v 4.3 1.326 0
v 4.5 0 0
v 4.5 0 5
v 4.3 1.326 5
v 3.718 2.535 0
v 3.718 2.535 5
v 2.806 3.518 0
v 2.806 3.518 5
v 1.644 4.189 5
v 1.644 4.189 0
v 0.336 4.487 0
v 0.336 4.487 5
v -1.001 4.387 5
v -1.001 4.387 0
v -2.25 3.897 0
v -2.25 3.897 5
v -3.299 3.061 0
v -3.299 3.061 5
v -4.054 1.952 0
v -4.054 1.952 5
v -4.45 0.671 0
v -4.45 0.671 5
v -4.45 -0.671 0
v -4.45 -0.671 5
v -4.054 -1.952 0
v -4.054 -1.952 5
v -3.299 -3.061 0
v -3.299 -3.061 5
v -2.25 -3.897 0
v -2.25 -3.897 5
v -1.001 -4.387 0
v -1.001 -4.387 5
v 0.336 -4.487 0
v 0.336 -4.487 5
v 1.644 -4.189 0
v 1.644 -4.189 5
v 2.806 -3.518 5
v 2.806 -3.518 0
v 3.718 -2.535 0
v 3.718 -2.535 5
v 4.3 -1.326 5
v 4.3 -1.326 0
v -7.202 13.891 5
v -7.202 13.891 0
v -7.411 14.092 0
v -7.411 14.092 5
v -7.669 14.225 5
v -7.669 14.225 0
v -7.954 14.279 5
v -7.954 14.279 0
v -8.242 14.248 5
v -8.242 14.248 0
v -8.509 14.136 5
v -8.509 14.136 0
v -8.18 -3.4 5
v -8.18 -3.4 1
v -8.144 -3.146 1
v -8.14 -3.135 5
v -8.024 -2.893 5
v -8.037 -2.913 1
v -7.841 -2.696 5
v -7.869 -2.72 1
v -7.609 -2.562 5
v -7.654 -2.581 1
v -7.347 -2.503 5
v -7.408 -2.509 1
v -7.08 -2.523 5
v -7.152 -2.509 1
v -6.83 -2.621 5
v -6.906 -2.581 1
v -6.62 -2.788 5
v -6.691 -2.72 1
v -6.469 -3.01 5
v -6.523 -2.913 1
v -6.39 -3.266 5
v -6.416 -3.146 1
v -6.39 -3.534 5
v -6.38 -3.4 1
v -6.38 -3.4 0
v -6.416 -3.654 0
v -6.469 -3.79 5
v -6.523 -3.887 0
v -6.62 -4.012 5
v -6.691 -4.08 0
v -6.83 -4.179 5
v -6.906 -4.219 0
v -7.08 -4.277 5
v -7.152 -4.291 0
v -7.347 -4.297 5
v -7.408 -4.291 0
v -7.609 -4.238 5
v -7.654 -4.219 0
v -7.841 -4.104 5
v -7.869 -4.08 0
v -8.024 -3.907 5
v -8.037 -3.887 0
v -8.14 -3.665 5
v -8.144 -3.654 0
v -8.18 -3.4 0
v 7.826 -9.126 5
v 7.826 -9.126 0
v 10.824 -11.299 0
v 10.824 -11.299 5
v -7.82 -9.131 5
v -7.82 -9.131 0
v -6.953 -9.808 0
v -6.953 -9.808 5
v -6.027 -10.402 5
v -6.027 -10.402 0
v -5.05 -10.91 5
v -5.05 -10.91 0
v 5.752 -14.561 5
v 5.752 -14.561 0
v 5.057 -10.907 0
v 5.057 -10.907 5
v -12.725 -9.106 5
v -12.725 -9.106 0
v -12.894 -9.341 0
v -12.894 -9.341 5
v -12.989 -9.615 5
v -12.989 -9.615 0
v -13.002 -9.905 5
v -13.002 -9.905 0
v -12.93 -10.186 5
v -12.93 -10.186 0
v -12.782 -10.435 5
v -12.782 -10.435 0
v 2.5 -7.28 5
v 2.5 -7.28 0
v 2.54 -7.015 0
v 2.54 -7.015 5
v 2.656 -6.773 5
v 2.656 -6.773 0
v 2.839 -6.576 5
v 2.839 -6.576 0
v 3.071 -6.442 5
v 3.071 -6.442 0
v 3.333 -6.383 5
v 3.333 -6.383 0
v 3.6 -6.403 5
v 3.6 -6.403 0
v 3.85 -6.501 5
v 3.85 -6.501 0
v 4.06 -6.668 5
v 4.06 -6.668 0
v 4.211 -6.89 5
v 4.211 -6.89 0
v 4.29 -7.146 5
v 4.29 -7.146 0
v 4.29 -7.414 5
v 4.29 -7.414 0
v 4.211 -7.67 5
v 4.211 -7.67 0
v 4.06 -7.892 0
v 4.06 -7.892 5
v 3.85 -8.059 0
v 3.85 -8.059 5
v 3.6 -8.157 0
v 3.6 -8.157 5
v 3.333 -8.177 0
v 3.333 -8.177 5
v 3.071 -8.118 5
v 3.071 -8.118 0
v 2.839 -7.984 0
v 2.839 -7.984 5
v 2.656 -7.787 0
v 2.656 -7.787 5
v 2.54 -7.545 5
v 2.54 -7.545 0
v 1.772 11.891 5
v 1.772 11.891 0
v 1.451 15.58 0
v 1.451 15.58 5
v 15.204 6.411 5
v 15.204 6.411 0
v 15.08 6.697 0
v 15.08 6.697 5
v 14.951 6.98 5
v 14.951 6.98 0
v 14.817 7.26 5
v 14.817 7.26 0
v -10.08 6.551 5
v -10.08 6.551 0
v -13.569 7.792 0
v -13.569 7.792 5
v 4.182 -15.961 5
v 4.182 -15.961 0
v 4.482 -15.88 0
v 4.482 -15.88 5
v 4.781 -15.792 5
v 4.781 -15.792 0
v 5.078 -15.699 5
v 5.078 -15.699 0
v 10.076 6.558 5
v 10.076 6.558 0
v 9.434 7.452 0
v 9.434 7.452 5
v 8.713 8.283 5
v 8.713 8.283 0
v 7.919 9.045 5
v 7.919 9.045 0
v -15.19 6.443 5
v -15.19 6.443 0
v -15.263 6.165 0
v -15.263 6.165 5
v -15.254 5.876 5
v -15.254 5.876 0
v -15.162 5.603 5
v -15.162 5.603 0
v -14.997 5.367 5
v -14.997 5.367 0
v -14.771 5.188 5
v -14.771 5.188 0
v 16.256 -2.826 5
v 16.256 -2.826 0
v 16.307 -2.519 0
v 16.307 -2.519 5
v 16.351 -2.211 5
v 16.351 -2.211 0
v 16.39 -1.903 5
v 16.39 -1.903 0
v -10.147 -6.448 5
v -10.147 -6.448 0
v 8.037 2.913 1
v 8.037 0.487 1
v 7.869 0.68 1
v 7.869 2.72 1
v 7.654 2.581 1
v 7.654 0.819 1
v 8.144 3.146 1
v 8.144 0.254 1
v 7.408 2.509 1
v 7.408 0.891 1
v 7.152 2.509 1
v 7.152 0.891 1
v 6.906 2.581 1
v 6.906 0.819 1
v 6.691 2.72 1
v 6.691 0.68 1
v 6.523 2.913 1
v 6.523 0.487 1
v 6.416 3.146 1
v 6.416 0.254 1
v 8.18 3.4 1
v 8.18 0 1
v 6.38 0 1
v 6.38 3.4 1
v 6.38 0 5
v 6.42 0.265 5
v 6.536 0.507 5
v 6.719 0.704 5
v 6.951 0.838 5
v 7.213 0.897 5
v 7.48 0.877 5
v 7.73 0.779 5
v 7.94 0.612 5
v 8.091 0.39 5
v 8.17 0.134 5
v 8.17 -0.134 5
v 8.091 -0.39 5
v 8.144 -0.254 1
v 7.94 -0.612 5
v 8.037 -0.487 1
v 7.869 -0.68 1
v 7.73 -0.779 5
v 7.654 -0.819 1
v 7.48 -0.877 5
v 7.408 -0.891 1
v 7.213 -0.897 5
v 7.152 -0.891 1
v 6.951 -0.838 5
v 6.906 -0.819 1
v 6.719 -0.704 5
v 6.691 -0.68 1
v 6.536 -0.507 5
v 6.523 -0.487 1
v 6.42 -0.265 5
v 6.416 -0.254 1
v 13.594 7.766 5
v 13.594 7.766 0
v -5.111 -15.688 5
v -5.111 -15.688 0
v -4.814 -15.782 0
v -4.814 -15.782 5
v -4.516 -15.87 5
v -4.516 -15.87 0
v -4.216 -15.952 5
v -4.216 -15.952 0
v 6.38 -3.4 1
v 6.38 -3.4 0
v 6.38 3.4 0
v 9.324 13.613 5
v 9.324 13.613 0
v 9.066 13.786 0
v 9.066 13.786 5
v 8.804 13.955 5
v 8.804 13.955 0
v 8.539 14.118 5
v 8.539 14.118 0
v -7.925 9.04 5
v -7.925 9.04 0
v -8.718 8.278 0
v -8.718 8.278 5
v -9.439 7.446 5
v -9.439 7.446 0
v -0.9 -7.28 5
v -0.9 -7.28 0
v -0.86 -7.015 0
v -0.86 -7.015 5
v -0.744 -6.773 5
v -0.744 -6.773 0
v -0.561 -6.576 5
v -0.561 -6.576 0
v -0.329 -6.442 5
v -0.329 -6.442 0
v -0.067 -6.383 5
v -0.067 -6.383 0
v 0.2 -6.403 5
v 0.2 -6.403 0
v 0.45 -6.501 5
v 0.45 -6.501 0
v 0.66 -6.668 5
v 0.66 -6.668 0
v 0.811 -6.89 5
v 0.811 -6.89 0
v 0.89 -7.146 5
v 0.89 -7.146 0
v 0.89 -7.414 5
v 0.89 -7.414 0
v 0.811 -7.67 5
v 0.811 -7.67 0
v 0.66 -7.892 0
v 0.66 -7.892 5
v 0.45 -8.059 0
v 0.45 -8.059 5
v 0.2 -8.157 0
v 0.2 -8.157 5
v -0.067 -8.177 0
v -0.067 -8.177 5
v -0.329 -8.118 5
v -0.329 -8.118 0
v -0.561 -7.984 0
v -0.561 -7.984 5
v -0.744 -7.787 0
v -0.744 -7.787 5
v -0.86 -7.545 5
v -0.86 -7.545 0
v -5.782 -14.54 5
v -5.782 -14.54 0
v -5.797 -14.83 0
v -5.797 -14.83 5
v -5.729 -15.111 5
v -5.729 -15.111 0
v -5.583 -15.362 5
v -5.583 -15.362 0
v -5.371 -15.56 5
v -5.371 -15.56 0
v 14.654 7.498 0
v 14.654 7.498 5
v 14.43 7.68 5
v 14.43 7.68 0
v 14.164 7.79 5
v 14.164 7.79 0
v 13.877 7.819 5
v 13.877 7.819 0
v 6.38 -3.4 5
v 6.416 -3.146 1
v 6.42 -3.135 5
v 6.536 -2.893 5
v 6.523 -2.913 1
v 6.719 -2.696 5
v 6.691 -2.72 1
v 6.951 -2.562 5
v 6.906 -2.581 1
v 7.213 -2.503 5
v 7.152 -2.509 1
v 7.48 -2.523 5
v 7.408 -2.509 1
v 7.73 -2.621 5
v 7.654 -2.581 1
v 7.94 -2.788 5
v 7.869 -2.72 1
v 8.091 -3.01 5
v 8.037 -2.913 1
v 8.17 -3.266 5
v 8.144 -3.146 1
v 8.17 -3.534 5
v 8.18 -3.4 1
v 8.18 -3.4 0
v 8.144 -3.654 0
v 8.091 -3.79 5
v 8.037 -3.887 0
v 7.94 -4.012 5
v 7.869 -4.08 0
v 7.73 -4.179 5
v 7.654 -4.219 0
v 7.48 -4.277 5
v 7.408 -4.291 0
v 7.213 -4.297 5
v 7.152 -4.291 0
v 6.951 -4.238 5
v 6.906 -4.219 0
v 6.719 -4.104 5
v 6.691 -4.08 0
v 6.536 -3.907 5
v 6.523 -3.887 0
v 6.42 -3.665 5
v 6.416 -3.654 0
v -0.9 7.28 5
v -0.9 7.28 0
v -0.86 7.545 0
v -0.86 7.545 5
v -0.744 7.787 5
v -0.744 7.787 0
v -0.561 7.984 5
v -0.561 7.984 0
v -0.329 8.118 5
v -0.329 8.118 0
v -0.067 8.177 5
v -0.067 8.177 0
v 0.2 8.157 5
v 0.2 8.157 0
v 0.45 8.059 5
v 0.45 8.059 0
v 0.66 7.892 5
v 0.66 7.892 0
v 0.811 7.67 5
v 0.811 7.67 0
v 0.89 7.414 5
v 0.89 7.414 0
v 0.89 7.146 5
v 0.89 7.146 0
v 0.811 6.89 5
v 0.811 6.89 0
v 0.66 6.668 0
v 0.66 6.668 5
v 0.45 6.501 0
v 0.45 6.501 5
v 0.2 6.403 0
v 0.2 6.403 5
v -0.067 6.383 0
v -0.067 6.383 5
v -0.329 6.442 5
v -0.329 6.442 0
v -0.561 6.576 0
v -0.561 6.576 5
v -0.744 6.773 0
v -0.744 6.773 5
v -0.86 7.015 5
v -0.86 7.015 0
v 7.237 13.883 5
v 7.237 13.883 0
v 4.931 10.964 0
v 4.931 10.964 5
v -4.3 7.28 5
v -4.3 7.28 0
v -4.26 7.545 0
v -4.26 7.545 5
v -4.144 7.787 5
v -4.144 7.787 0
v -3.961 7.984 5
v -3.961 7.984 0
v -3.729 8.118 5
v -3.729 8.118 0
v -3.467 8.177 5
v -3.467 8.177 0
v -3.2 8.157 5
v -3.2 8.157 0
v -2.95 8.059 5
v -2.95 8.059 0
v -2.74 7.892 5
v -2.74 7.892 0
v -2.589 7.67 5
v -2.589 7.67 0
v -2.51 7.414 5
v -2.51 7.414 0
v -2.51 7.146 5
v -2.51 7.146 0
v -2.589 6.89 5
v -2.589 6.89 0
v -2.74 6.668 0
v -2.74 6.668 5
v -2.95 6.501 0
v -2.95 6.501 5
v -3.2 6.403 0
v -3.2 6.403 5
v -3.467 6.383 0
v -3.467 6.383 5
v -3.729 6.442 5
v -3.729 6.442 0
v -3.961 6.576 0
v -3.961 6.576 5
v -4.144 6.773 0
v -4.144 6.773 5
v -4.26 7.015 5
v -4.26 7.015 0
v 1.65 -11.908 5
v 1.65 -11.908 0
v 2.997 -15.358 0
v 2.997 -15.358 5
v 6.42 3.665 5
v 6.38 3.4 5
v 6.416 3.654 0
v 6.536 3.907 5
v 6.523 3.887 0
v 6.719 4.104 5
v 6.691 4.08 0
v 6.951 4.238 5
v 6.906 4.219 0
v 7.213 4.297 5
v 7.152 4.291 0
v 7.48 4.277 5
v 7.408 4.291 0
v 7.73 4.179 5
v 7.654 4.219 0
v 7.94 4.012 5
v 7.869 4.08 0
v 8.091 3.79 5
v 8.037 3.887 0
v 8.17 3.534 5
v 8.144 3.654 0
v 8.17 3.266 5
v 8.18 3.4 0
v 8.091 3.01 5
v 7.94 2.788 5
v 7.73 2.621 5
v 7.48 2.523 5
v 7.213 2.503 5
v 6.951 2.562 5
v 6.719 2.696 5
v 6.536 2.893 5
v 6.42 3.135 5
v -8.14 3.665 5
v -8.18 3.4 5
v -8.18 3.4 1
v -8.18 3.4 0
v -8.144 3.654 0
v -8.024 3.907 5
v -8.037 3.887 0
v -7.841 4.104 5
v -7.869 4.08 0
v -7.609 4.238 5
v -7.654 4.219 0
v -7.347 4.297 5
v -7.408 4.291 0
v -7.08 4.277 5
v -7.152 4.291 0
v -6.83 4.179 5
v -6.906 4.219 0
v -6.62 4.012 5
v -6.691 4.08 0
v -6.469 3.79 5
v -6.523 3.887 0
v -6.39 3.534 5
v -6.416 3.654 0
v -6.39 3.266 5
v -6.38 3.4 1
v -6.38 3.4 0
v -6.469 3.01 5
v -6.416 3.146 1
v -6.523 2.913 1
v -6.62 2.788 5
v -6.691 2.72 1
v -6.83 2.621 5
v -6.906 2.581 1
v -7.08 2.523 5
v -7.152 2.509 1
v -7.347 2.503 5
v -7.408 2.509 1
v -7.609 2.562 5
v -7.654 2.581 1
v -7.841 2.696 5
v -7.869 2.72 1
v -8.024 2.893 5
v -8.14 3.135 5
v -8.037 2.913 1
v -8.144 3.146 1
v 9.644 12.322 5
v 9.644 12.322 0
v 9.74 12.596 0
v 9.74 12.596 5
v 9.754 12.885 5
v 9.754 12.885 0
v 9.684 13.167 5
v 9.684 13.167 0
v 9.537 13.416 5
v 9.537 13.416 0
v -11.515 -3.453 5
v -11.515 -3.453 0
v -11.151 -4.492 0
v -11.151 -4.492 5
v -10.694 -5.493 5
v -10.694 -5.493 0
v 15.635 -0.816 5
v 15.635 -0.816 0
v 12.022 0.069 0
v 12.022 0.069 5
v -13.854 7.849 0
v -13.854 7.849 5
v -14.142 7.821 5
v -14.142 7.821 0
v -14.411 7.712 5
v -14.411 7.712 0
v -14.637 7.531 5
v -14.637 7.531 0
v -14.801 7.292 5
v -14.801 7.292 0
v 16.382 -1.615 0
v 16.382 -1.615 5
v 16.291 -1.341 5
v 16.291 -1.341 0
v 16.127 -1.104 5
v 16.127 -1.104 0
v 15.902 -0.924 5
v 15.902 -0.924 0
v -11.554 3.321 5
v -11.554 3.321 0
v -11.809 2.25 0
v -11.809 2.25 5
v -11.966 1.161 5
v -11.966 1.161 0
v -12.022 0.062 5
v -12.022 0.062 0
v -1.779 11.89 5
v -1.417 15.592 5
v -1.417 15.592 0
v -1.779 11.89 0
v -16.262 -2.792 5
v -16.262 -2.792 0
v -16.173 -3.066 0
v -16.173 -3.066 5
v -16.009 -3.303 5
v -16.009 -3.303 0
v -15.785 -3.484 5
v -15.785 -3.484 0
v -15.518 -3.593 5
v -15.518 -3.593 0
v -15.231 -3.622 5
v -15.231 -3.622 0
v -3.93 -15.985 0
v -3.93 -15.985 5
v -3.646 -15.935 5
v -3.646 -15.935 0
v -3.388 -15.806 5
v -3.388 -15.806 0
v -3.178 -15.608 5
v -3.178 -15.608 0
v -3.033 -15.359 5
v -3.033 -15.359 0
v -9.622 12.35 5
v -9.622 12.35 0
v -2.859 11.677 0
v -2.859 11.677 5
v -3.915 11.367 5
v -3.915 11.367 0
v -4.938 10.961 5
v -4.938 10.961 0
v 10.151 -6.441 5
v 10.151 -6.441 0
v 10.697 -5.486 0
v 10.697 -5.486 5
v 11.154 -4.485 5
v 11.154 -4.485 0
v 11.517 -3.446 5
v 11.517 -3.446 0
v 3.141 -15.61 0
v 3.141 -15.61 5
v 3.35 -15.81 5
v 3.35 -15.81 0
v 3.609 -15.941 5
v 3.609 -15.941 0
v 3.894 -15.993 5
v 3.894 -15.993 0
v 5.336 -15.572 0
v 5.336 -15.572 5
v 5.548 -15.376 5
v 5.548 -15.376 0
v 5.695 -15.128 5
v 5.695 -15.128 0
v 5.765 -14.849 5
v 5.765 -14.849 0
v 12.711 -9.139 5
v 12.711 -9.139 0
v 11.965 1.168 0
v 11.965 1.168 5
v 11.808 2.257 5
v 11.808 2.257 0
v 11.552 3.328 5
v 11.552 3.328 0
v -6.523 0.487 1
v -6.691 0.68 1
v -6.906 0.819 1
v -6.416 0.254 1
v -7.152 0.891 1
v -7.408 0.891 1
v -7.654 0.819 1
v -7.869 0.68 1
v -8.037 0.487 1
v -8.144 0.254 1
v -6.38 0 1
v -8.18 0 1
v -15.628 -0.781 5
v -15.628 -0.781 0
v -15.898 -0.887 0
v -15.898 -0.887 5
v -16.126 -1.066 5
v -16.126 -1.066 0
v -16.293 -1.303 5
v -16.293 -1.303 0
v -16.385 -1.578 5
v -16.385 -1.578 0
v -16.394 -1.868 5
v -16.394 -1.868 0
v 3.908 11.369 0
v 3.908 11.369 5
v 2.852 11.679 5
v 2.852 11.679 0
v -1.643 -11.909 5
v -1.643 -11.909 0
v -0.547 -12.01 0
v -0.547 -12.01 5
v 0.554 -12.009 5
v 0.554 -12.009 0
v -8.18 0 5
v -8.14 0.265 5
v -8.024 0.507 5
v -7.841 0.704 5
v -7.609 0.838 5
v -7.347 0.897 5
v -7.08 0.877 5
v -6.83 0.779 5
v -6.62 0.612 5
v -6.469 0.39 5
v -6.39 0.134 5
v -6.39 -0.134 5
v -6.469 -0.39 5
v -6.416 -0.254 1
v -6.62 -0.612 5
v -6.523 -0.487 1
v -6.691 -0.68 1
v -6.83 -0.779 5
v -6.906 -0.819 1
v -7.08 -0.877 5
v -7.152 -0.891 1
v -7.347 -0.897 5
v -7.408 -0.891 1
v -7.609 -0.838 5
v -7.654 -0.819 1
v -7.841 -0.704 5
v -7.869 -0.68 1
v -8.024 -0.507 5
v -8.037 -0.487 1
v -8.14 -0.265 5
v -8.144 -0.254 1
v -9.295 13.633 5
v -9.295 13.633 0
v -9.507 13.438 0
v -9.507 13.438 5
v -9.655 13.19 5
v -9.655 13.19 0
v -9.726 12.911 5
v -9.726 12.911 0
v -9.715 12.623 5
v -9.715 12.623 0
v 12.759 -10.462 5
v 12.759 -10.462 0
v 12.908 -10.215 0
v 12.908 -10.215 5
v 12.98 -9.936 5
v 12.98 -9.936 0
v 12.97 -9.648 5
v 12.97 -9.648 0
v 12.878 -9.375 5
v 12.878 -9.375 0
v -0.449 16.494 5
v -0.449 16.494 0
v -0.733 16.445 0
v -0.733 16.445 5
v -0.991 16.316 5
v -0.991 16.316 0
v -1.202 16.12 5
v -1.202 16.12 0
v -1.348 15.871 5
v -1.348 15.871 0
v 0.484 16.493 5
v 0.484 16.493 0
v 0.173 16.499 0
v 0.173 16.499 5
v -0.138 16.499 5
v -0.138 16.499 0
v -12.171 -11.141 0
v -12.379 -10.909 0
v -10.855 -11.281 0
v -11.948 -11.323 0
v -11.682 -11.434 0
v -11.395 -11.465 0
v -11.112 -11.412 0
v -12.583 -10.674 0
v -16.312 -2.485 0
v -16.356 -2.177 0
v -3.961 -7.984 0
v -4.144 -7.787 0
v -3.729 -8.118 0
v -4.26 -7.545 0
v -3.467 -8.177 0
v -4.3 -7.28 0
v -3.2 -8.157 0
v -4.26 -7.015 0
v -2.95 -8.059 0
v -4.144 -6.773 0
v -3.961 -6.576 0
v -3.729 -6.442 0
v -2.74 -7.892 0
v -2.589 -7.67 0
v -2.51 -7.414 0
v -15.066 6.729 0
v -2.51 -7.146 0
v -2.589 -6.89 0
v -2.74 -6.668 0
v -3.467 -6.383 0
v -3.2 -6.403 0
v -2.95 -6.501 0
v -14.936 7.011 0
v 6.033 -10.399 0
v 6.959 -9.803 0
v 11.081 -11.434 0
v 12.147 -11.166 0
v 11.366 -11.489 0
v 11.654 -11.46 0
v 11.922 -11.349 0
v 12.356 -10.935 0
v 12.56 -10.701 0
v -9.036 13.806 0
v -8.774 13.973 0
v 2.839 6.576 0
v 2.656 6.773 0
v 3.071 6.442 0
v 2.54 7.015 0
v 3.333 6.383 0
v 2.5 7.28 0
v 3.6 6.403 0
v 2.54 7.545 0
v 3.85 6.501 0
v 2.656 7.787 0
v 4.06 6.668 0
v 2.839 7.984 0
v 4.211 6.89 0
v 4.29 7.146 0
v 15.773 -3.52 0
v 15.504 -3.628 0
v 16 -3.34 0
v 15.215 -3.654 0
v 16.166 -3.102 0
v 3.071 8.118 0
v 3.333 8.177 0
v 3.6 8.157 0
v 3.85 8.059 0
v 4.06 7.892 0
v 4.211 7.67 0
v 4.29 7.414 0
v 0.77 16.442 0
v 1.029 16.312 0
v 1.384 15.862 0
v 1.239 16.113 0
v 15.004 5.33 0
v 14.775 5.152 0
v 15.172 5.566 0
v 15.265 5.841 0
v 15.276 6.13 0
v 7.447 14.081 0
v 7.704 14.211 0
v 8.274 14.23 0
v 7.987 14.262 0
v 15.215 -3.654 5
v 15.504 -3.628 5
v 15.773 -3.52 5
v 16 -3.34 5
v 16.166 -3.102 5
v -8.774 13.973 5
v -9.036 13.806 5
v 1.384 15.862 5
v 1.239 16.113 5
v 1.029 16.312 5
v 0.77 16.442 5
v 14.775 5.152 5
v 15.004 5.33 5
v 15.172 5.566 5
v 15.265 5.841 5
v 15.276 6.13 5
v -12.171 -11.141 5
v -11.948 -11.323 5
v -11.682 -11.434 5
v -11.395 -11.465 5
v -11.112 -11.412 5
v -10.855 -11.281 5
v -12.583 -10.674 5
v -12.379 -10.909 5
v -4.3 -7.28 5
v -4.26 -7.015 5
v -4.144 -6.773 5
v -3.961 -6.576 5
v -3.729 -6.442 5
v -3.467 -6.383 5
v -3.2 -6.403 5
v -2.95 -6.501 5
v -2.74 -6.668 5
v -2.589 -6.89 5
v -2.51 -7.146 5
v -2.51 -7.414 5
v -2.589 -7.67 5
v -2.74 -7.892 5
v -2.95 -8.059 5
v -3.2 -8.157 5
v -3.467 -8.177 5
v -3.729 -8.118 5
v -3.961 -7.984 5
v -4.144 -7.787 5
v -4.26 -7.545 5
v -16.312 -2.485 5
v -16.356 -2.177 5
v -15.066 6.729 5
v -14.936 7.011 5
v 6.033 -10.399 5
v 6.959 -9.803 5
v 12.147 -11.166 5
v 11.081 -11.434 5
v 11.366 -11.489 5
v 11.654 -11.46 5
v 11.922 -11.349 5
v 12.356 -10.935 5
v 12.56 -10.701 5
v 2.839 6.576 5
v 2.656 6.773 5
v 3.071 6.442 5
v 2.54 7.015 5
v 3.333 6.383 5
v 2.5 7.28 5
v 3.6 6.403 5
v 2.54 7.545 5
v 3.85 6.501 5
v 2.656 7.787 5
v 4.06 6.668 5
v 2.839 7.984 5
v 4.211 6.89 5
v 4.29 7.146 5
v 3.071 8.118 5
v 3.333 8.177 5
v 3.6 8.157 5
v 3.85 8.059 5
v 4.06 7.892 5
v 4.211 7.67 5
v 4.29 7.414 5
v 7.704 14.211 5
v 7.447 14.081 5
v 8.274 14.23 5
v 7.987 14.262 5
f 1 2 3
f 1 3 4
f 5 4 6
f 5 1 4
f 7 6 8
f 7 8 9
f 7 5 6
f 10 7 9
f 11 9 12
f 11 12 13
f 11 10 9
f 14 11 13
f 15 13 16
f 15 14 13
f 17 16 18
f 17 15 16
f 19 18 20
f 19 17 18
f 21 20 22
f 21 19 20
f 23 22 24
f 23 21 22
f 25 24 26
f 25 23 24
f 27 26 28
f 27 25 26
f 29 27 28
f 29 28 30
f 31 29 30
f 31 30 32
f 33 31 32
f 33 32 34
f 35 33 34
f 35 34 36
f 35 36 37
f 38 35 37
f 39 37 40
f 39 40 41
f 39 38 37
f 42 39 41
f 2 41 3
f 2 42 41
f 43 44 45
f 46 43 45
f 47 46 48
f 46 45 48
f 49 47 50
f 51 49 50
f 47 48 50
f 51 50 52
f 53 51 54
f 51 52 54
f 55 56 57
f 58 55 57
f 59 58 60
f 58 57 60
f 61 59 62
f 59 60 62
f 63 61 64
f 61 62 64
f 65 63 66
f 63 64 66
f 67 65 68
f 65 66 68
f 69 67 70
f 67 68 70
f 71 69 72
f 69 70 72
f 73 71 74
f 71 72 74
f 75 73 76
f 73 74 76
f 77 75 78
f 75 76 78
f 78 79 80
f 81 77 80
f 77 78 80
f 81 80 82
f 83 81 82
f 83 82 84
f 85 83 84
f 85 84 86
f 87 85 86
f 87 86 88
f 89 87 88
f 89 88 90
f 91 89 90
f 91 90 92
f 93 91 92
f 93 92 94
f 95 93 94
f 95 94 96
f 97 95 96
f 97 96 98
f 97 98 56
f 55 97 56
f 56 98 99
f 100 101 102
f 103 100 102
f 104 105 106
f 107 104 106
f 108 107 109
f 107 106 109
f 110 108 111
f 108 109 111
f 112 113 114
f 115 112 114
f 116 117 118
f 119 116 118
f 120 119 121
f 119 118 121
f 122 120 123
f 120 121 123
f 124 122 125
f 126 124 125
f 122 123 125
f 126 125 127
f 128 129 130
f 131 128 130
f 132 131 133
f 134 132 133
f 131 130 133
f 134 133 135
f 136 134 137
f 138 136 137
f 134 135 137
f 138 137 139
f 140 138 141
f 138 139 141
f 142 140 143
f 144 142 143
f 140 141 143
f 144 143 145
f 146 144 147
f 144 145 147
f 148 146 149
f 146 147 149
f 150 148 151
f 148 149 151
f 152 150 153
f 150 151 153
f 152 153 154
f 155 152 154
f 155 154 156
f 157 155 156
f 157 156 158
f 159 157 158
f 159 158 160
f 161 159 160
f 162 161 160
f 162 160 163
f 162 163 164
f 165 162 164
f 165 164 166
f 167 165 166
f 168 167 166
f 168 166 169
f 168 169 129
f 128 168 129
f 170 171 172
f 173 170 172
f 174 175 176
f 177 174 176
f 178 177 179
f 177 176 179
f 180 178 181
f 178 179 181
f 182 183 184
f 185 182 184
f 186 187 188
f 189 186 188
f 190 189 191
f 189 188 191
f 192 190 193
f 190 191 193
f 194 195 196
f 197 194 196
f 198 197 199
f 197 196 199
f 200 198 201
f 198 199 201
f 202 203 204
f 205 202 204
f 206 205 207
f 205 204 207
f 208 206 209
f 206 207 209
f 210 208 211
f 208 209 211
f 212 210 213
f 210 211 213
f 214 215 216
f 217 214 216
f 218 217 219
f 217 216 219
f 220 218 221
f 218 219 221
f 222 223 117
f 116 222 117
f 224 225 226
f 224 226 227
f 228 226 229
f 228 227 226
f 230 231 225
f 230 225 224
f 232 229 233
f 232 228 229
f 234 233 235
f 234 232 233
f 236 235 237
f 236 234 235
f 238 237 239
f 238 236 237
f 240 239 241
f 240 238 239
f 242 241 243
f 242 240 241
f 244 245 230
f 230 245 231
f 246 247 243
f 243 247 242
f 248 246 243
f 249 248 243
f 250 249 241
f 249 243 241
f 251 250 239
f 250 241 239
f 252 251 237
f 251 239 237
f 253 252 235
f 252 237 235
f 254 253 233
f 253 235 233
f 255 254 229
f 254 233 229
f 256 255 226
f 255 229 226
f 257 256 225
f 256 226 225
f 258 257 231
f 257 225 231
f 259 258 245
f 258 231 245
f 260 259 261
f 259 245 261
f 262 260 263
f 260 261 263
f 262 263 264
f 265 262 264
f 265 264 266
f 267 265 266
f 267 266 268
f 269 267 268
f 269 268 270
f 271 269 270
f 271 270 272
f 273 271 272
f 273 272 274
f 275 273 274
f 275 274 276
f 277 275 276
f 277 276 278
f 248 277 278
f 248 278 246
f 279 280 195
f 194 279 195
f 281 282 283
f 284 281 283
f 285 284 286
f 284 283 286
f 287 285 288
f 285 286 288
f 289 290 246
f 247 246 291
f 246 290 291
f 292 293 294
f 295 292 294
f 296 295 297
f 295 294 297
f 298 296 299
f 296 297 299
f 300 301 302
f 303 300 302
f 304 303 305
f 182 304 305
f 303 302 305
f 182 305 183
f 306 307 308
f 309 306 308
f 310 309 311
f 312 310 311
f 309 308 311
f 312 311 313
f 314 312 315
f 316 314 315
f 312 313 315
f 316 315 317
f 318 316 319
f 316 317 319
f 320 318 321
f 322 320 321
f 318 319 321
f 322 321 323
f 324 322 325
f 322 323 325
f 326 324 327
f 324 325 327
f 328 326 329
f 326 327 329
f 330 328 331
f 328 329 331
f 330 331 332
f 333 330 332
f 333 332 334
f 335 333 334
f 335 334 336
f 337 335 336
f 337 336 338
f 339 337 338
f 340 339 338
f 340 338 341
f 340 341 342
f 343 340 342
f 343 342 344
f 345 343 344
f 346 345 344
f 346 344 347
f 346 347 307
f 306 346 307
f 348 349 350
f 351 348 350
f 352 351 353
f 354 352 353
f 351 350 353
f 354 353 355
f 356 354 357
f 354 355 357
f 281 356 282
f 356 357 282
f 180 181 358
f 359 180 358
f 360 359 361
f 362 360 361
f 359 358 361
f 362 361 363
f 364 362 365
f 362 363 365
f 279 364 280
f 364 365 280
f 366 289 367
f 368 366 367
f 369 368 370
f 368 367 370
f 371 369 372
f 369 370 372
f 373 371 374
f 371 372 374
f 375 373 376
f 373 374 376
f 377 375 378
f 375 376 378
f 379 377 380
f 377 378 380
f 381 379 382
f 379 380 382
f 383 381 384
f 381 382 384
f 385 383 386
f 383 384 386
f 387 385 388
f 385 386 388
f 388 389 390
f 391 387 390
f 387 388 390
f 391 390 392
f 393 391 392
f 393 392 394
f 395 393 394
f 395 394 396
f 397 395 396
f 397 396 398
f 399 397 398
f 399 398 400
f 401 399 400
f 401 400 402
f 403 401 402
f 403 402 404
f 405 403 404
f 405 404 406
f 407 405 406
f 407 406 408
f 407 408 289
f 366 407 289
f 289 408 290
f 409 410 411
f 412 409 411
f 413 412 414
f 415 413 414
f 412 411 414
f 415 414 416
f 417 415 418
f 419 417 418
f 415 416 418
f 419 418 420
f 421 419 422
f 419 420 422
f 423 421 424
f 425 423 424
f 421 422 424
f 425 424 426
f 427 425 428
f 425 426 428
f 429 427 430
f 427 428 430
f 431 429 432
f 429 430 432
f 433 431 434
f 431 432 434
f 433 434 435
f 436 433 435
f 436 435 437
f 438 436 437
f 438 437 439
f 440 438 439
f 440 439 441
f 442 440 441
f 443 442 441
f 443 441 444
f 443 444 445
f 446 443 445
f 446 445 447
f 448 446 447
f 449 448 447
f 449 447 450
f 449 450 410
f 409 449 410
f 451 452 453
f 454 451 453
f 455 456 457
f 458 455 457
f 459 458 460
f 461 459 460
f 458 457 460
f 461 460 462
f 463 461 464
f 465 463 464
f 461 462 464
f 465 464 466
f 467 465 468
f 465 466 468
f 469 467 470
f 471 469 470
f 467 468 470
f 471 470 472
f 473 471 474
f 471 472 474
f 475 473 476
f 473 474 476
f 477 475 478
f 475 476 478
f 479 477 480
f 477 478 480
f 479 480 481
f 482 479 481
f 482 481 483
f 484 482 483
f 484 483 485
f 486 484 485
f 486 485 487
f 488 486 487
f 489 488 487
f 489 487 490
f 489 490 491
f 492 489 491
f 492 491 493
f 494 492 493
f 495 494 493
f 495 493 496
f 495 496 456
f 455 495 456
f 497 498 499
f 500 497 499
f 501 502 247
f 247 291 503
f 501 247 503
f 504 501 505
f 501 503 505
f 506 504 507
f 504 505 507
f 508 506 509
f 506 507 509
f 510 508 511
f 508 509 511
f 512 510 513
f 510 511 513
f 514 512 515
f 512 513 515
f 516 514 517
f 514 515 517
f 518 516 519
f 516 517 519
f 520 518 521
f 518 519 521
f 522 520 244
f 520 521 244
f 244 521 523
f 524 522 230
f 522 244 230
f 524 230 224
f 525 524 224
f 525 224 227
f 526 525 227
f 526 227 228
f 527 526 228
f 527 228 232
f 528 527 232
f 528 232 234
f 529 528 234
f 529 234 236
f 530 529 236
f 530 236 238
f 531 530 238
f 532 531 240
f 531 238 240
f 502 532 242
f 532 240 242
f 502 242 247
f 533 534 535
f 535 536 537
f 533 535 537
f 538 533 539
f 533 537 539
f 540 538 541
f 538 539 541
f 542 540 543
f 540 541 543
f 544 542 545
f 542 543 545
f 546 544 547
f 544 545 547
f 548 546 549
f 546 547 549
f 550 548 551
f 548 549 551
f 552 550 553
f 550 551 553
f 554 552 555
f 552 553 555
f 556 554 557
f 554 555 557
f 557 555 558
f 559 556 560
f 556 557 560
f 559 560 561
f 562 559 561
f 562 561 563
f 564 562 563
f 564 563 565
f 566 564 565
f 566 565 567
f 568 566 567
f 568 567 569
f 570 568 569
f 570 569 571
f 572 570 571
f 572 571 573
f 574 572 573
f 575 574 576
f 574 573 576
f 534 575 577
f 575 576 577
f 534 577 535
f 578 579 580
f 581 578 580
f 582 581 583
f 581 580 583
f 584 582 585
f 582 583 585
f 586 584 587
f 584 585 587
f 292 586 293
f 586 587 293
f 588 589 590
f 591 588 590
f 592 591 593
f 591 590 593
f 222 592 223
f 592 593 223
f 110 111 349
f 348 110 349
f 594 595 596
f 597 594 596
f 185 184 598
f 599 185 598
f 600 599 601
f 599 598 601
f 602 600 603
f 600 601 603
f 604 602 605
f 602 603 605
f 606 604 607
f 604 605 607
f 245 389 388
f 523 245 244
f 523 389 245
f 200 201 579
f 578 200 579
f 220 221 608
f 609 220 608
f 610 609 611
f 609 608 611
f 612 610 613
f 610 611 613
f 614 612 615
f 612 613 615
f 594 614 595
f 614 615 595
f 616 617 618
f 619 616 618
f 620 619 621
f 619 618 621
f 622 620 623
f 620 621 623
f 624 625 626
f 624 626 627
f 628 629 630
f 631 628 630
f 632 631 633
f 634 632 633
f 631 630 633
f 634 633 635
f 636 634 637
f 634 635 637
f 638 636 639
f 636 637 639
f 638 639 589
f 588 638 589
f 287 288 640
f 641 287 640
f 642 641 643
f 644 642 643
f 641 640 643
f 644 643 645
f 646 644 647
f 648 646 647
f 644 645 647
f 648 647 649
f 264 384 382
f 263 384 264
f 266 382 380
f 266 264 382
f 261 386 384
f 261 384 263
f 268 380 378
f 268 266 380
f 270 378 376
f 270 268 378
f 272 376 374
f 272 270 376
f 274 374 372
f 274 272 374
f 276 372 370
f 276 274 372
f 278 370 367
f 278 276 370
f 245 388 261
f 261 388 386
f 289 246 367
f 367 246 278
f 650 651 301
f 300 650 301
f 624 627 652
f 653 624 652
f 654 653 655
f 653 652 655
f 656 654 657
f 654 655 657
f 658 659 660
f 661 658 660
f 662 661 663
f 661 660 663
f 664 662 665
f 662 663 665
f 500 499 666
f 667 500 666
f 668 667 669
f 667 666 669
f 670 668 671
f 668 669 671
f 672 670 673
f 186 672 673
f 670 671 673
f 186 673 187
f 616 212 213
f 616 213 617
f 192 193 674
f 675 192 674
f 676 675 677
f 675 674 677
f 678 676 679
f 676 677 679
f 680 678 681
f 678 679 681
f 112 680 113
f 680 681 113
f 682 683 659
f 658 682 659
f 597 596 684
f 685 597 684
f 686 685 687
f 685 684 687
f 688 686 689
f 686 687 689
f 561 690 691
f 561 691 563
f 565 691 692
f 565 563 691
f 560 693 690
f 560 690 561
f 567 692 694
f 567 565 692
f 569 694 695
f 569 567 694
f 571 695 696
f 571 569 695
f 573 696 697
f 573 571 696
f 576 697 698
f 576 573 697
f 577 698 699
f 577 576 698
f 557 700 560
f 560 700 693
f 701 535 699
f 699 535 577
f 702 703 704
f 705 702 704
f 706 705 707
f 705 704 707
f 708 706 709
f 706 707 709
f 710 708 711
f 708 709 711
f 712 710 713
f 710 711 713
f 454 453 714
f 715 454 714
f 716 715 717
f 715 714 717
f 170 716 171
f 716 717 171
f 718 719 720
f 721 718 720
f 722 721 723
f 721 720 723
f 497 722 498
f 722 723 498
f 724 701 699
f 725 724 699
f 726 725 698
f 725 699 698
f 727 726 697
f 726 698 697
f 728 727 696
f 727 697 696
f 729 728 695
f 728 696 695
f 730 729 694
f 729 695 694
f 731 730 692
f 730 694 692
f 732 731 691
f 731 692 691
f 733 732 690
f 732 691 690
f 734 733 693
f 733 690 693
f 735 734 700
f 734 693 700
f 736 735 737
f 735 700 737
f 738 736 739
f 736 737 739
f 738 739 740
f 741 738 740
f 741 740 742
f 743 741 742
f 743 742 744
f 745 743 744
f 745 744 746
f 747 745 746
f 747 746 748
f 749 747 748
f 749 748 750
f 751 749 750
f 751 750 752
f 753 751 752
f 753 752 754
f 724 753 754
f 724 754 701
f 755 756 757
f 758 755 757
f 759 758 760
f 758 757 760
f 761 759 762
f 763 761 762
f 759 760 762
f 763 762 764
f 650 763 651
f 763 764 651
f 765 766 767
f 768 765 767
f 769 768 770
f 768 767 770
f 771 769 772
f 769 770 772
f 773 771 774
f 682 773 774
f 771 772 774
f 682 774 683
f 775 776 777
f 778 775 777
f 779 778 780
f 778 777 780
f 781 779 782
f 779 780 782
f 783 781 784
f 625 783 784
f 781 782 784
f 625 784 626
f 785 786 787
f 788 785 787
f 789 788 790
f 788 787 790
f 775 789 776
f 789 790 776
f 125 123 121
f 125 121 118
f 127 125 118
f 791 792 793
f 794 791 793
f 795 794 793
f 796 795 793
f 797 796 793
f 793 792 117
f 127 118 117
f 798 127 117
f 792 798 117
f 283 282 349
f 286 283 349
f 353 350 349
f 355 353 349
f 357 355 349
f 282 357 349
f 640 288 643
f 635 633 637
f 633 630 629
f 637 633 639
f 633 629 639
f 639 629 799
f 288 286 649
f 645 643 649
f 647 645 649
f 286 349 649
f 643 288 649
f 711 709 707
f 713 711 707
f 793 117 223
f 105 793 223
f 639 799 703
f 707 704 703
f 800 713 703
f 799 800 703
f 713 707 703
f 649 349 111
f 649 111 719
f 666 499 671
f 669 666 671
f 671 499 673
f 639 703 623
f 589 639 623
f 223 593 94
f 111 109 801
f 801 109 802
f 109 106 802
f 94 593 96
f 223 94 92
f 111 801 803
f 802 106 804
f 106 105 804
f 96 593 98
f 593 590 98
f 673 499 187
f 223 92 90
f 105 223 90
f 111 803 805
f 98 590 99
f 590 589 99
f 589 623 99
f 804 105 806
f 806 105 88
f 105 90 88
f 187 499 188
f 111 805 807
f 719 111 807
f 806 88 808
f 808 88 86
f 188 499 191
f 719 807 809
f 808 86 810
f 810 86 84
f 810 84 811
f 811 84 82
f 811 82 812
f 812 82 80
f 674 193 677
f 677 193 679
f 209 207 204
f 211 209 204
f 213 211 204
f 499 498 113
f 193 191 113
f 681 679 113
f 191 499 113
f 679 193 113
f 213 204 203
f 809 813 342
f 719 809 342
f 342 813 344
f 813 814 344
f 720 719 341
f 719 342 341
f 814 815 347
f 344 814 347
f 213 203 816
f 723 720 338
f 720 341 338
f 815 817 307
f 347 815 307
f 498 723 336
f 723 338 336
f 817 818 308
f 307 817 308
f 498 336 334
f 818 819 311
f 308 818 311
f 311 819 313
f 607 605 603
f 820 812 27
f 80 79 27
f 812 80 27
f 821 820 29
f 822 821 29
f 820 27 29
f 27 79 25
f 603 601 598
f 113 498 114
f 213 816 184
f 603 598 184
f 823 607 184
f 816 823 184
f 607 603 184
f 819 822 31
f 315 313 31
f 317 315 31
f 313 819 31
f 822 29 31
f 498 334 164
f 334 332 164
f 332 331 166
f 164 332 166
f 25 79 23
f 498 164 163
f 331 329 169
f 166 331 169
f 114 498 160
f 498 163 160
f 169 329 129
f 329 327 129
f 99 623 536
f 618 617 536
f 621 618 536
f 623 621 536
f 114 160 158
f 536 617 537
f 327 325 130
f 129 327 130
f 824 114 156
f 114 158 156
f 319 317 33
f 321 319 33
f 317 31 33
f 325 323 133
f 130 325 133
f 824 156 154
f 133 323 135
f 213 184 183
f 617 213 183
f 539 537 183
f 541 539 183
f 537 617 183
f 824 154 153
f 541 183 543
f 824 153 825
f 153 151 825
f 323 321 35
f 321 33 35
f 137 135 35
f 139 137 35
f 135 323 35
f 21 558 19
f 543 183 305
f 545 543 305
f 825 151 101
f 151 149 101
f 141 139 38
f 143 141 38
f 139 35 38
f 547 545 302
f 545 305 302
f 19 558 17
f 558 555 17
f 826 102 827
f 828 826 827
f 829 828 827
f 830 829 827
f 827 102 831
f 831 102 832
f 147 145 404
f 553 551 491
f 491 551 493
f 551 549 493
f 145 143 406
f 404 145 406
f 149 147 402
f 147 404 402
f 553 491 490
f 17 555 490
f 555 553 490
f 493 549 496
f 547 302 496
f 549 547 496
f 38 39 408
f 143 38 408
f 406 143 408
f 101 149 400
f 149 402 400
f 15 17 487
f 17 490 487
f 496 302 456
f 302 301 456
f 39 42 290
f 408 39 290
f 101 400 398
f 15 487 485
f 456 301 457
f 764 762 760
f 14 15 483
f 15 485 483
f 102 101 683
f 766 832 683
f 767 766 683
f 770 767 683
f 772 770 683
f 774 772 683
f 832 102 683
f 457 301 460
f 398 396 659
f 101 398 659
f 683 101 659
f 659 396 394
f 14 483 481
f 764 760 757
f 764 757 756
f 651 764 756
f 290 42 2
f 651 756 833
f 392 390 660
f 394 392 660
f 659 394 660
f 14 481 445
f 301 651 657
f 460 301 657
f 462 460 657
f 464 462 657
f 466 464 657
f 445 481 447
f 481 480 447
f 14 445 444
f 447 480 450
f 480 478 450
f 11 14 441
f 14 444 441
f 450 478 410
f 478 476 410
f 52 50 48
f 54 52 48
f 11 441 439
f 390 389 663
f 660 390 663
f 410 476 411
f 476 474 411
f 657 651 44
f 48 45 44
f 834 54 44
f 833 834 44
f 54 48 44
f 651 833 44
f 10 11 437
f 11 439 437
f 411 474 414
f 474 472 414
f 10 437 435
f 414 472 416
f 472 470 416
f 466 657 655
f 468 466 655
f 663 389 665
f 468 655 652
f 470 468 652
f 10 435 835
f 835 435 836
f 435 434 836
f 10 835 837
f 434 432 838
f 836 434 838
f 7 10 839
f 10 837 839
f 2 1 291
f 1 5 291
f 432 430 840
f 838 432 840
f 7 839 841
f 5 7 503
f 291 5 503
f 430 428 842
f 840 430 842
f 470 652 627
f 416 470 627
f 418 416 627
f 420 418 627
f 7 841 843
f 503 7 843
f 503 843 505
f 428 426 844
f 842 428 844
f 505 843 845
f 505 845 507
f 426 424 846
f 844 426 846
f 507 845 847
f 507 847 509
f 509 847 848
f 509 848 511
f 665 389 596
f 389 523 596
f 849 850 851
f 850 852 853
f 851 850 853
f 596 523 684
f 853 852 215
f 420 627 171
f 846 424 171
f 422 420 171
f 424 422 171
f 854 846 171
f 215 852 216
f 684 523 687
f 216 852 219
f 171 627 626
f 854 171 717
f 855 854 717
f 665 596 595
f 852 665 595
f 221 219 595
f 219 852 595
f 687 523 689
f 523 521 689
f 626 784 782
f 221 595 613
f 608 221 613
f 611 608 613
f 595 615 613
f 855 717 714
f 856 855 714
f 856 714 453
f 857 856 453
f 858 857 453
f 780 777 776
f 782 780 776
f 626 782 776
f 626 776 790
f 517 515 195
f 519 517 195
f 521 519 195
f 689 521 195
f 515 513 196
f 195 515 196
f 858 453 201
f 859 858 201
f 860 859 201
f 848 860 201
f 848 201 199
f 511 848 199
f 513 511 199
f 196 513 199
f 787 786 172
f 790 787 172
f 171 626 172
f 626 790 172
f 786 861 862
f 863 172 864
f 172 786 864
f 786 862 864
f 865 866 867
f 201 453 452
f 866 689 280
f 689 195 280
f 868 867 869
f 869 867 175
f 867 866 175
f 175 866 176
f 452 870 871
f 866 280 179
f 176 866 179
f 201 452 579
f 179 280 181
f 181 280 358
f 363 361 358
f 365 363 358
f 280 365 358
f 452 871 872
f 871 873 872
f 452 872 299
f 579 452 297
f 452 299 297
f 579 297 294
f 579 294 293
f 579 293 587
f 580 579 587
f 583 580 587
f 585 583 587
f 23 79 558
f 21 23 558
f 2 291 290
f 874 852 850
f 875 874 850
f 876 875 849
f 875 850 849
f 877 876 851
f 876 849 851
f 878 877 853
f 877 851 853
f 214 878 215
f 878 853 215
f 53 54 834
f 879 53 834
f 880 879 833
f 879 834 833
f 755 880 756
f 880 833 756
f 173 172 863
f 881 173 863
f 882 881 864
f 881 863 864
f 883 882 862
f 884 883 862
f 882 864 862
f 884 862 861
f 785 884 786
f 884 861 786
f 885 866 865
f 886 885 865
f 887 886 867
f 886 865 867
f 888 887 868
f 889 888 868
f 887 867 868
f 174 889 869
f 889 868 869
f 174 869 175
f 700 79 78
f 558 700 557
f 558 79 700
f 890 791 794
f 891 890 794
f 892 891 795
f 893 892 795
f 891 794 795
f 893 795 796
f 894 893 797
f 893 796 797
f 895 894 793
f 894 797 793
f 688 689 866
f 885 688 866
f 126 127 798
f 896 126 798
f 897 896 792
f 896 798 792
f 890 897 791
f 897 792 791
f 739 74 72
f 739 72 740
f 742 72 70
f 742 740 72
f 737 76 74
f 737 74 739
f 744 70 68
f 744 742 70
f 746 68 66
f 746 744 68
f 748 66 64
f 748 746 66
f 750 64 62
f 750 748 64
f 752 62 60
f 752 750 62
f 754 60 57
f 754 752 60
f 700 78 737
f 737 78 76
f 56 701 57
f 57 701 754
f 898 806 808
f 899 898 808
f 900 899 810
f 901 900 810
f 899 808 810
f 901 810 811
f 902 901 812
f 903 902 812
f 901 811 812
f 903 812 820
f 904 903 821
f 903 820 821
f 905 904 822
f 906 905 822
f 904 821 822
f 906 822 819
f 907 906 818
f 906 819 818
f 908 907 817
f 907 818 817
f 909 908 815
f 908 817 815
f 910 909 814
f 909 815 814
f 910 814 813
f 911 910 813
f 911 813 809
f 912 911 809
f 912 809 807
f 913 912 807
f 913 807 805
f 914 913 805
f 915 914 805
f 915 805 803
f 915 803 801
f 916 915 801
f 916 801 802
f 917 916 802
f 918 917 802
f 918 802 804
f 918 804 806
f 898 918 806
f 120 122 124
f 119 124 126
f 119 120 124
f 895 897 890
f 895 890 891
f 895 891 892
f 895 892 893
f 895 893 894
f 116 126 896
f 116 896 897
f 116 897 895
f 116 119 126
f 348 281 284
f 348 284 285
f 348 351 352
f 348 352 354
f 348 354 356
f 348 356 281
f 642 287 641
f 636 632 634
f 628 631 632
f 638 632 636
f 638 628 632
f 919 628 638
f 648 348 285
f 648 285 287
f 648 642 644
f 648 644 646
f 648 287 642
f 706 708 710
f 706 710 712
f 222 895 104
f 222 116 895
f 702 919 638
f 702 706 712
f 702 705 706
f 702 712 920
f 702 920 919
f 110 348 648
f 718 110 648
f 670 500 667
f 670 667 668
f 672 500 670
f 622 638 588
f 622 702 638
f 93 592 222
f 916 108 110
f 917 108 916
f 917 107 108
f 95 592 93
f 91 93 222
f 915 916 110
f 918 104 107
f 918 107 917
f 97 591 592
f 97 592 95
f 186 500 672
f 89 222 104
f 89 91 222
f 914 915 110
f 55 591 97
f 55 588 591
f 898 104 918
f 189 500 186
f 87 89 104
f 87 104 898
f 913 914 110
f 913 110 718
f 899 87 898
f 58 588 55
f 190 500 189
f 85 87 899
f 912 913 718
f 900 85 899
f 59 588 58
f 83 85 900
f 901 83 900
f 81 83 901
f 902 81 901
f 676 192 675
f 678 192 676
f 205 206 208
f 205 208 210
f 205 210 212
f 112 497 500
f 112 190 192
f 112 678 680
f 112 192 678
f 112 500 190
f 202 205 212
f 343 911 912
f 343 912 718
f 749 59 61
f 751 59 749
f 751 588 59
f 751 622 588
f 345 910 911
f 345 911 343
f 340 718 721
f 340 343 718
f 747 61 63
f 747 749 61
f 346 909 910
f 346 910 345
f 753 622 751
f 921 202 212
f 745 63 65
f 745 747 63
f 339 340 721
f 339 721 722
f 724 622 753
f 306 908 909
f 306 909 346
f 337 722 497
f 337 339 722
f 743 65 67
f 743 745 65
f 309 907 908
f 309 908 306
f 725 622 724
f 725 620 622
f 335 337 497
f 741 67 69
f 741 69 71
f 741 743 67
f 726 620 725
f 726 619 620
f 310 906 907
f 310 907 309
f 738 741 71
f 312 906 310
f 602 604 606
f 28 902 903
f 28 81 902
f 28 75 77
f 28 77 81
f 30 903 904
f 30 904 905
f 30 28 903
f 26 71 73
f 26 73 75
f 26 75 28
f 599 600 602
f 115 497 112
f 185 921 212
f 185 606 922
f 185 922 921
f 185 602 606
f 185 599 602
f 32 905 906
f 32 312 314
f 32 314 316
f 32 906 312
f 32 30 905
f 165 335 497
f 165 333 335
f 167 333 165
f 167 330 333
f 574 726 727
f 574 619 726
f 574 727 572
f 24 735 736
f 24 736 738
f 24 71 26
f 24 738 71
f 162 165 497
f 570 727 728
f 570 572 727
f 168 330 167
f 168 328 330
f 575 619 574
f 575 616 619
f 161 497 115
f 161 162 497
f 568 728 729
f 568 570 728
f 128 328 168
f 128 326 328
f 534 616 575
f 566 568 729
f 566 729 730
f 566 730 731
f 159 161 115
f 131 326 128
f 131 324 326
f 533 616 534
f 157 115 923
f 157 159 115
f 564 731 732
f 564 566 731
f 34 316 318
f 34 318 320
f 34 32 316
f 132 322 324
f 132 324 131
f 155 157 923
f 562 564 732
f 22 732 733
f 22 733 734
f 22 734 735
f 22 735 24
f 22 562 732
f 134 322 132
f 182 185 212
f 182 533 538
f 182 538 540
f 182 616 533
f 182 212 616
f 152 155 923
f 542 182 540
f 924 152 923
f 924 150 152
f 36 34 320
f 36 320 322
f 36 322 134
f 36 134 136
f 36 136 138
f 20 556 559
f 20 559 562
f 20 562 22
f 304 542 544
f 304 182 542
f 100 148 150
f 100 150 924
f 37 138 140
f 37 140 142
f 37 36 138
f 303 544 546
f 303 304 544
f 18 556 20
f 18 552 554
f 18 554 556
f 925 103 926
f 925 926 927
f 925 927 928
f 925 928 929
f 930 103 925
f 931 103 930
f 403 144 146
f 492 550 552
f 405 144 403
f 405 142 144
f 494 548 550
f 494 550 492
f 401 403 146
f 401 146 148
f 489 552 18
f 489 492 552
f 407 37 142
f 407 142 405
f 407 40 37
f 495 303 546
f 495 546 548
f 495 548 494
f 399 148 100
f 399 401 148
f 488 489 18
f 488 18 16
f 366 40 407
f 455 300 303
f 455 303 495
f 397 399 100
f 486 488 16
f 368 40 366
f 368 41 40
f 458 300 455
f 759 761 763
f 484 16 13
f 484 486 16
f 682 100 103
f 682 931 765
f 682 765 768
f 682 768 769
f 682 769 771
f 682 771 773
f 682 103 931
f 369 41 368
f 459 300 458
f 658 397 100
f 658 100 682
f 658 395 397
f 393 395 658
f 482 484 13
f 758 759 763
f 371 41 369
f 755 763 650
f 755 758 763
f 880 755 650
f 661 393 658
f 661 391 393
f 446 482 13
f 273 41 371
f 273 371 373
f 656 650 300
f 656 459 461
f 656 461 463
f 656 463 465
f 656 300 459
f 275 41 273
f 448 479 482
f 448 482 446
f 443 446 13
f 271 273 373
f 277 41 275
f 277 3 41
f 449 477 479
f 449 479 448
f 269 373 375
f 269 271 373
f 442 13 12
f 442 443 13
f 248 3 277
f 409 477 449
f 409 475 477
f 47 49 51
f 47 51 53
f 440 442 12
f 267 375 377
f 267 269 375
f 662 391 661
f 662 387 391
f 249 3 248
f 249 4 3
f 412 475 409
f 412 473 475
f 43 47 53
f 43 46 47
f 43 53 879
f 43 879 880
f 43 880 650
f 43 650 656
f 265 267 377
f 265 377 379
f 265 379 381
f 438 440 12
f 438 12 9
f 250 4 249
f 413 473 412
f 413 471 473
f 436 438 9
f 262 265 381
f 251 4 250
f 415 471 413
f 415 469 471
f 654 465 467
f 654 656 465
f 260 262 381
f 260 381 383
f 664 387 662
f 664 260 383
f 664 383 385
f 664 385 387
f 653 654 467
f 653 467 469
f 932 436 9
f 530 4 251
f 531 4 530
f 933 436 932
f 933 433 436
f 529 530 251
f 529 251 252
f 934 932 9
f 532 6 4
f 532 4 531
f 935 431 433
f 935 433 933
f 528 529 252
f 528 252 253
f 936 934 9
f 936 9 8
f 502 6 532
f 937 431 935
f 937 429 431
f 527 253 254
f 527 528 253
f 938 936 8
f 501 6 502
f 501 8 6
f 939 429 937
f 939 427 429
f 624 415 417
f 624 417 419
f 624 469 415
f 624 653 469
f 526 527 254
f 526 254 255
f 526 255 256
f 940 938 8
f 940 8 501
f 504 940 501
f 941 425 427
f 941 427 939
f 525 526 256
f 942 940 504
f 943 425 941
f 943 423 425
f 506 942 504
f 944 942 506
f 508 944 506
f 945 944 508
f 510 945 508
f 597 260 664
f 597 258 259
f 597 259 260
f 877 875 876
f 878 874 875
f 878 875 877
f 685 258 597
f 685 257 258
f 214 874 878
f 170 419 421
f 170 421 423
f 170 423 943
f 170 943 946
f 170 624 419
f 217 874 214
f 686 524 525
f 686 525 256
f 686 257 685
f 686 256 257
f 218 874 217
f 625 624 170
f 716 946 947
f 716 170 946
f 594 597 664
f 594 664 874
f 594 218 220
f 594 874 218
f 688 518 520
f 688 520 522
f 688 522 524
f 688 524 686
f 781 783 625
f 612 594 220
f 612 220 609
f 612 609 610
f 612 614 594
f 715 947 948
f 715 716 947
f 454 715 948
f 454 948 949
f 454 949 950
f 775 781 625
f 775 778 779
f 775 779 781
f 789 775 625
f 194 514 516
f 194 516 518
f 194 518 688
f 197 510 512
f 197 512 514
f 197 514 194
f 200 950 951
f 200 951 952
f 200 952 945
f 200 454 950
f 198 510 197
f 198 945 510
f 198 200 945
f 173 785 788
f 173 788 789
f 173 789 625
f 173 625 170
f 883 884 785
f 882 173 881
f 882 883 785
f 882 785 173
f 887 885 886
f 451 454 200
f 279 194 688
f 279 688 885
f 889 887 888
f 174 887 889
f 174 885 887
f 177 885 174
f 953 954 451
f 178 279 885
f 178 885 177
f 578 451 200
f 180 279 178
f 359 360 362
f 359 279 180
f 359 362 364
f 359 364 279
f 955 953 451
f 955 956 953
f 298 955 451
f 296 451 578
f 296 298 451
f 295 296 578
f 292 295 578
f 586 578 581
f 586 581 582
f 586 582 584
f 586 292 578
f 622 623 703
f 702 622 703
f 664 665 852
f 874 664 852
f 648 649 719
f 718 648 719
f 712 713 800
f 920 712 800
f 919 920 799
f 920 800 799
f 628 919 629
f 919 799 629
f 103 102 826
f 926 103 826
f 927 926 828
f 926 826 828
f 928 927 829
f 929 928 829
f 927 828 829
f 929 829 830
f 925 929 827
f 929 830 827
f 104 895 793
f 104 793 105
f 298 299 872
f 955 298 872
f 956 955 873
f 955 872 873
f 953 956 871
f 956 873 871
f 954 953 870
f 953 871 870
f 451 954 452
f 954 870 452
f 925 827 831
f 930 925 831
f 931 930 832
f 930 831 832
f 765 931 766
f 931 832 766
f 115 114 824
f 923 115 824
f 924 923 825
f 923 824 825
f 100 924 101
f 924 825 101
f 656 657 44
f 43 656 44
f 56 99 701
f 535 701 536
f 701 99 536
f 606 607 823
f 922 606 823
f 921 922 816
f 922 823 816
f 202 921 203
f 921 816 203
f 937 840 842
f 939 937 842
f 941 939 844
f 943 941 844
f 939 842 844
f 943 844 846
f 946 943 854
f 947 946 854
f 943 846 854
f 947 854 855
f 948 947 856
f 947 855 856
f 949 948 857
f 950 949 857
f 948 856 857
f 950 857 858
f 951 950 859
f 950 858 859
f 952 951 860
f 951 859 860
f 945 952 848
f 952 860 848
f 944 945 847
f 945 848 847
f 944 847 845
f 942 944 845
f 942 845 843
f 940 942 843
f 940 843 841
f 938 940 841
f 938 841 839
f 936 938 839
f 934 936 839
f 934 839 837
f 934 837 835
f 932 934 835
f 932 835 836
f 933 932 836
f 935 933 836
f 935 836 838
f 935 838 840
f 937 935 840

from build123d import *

# Parameters (mm, degrees)
ESBO_O1_R                = 4.5
RESSALTO_EXTRUS_O1_DEPTH = 5
ESBO_O3_R                = 0.9
CORTE_EXTRUS_O4_DEPTH    = 11.8
ESBO_O5_W                = 1.8
ESBO_O5_H                = 6.8
CORTE_EXTRUS_O5_DEPTH    = 1


with BuildPart() as part:
    # Esboço1 → Ressalto-extrusão1 (new body)
    with BuildSketch(Plane.XY):
        with BuildLine():
            Line((7.237292739, 13.882644275), (4.931205446, 10.964033635))
            ThreePointArc((4.931205446, 10.964033635), (3.383365404, 11.536015744), (1.77178072, 11.89065237))
            Line((1.77178072, 11.89065237), (1.451023847, 15.579942687))
            ThreePointArc((1.451023847, 15.579942687), (1.141313879, 16.220426504), (0.484122849, 16.4928962))
            ThreePointArc((0.484122849, 16.4928962), (0.017522037, 16.499990696), (-0.449092791, 16.493887221))
            ThreePointArc((-0.449092791, 16.493887221), (-1.103704511, 16.225768855), (-1.417126065, 15.591599404))
            Line((-1.417126065, 15.591599404), (-1.779210104, 11.889542973))
            ThreePointArc((-1.779210104, 11.889542973), (-3.390572883, 11.533899437), (-4.938055227, 10.960950291))
            Line((-4.938055227, 10.960950291), (-7.202474013, 13.891164545))
            ThreePointArc((-7.202474013, 13.891164545), (-7.809290312, 14.262531969), (-8.509462826, 14.136443768))
            ThreePointArc((-8.509462826, 14.136443768), (-8.905827982, 13.890148593), (-9.295069567, 13.632743002))
            ThreePointArc((-9.295069567, 13.632743002), (-9.700808257, 13.053277663), (-9.621617356, 12.350331887))
            Line((-9.621617356, 12.350331887), (-7.924739018, 9.040206424))
            ThreePointArc((-7.924739018, 9.040206424), (-9.088028236, 7.869851554), (-10.08009353, 6.55122394))
            Line((-10.08009353, 6.55122394), (-13.569237263, 7.792039811))
            ThreePointArc((-13.569237263, 7.792039811), (-14.280500006, 7.776384308), (-14.80135418, 7.291770323))
            ThreePointArc((-14.80135418, 7.291770323), (-15.001640543, 6.870282455), (-15.189927432, 6.443299203))
            ThreePointArc((-15.189927432, 6.443299203), (-15.217973923, 5.736463043), (-14.771313119, 5.187921259))
            Line((-14.771313119, 5.187921259), (-11.554219287, 3.320668211))
            ThreePointArc((-11.554219287, 3.320668211), (-11.900098837, 1.707181407), (-12.02177336, 0.061530278))
            Line((-12.02177336, 0.061530278), (-15.627863558, -0.781002507))
            ThreePointArc((-15.627863558, -0.781002507), (-16.21775185, -1.178710425), (-16.393920163, -1.867988679))
            ThreePointArc((-16.393920163, -1.867988679), (-16.334538228, -2.330849819), (-16.262090664, -2.791846566))
            ThreePointArc((-16.262090664, -2.791846566), (-15.903540395, -3.401638061), (-15.231221337, -3.621617713))
            Line((-15.231221337, -3.621617713), (-11.51531657, -3.453158696))
            ThreePointArc((-11.51531657, -3.453158696), (-10.93397214, -4.997506773), (-10.14662509, -6.447698813))
            Line((-10.14662509, -6.447698813), (-12.724753595, -9.106082048))
            ThreePointArc((-12.724753595, -9.106082048), (-13.005982071, -9.759572927), (-12.781532328, -10.434674473))
            ThreePointArc((-12.781532328, -10.434674473), (-12.48133544, -10.791953745), (-12.171155012, -11.140600777))
            ThreePointArc((-12.171155012, -11.140600777), (-11.53984516, -11.459743115), (-10.855324398, -11.28131865))
            Line((-10.855324398, -11.28131865), (-7.820382206, -9.130632116))
            ThreePointArc((-7.820382206, -9.130632116), (-6.496386543, -10.115521864), (-5.049995046, -10.909829088))
            Line((-5.049995046, -10.909829088), (-5.781624274, -14.540044879))
            ThreePointArc((-5.781624274, -14.540044879), (-5.664904879, -15.241839982), (-5.111098288, -15.68842485))
            ThreePointArc((-5.111098288, -15.68842485), (-4.665396838, -15.826688609), (-4.215963642, -15.952292956))
            ThreePointArc((-4.215963642, -15.952292956), (-3.512330623, -15.879460702), (-3.032938663, -15.359280625))
            Line((-3.032938663, -15.359280625), (-1.642531748, -11.909194354))
            ThreePointArc((-1.642531748, -11.909194354), (0.003755879, -12.021930236), (1.649972743, -11.908165713))
            Line((1.649972743, -11.908165713), (2.997129903, -15.357646195))
            ThreePointArc((2.997129903, -15.357646195), (3.474739585, -15.884930537), (4.182073344, -15.961211187))
            ThreePointArc((4.182073344, -15.961211187), (4.631772295, -15.836561666), (5.077766396, -15.699244836))
            ThreePointArc((5.077766396, -15.699244836), (5.630324069, -15.257561714), (5.752383667, -14.560779526))
            Line((5.752383667, -14.560779526), (5.056810935, -10.90667153))
            ThreePointArc((5.056810935, -10.90667153), (6.502705837, -10.111460701), (7.826085845, -9.125743863))
            Line((7.826085845, -9.125743863), (10.824316513, -11.299303357))
            ThreePointArc((10.824316513, -11.299303357), (11.511178782, -11.484667883), (12.147466239, -11.166425748))
            ThreePointArc((12.147466239, -11.166425748), (12.458386452, -10.81843829), (12.759341481, -10.461797406))
            ThreePointArc((12.759341481, -10.461797406), (12.985390652, -9.791494687), (12.711364828, -9.139333809))
            Line((12.711364828, -9.139333809), (10.150651876, -6.441357558))
            ThreePointArc((10.150651876, -6.441357558), (10.937092637, -4.990673837), (11.517471987, -3.445962816))
            Line((11.517471987, -3.445962816), (15.21485911, -3.65351154))
            ThreePointArc((15.21485911, -3.65351154), (15.89290005, -3.438104324), (16.256124433, -2.826379032))
            ThreePointArc((16.256124433, -2.826379032), (16.329550936, -2.365537195), (16.389915799, -1.902803219))
            ThreePointArc((16.389915799, -1.902803219), (16.217687452, -1.21669728), (15.63457747, -0.816214183))
            Line((15.63457747, -0.816214183), (12.021732567, 0.069041925))
            ThreePointArc((12.021732567, 0.069041925), (11.899029803, 1.714616707), (11.552142152, 3.327887077))
            Line((11.552142152, 3.327887077), (14.774791444, 5.152244377))
            ThreePointArc((14.774791444, 5.152244377), (15.228737846, 5.700033066), (15.203577979, 6.411023056))
            ThreePointArc((15.203577979, 6.411023056), (15.016198378, 6.838405244), (14.816807657, 7.260317546))
            ThreePointArc((14.816807657, 7.260317546), (14.300983076, 7.744392916), (13.593922234, 7.766047679))
            Line((13.593922234, 7.766047679), (10.07599811, 6.557521086))
            ThreePointArc((10.07599811, 6.557521086), (9.083109081, 7.875528562), (7.919088807, 9.045156337))
            Line((7.919088807, 9.045156337), (9.643831887, 12.322199108))
            ThreePointArc((9.643831887, 12.322199108), (9.729558977, 13.028450232), (9.324002941, 13.612970622))
            ThreePointArc((9.324002941, 13.612970622), (8.935308934, 13.871202336), (8.539467774, 14.118338788))
            ThreePointArc((8.539467774, 14.118338788), (7.843817619, 14.246693081), (7.237292739, 13.882644275))
        make_face()
        Circle(ESBO_O1_R, mode=Mode.SUBTRACT)
    extrude(amount=RESSALTO_EXTRUS_O1_DEPTH)

    # Esboço3 → Corte-extrusão4 (cut)
    with BuildSketch(Plane(origin=(0, 0, 0), x_dir=(-1, 0, 0), z_dir=(0, 0, -1))):
        with Locations((3.4, 7.28)):
            Circle(ESBO_O3_R)
        with Locations((0, 7.28)):
            Circle(ESBO_O3_R)
        with Locations((-3.4, 7.28)):
            Circle(ESBO_O3_R)
        with Locations((7.28, -3.4)):
            Circle(ESBO_O3_R)
        with Locations((7.28, 0)):
            Circle(ESBO_O3_R)
        with Locations((7.28, 3.4)):
            Circle(ESBO_O3_R)
        with Locations((-3.4, -7.28)):
            Circle(ESBO_O3_R)
        with Locations((0, -7.28)):
            Circle(ESBO_O3_R)
        with Locations((3.4, -7.28)):
            Circle(ESBO_O3_R)
        with Locations((-7.28, 3.4)):
            Circle(ESBO_O3_R)
        with Locations((-7.28, 0)):
            Circle(ESBO_O3_R)
        with Locations((-7.28, -3.4)):
            Circle(ESBO_O3_R)
    extrude(amount=-CORTE_EXTRUS_O4_DEPTH, mode=Mode.SUBTRACT)

    # Esboço5 → Corte-extrusão5 (cut)
    with BuildSketch(Plane(origin=(0, 0, 0), x_dir=(-1, 0, 0), z_dir=(0, 0, -1))):
        with Locations((7.28, 0)):
            Rectangle(ESBO_O5_W, ESBO_O5_H)
        with Locations((-7.28, 0)):
            Rectangle(ESBO_O5_W, ESBO_O5_H)
    extrude(amount=-CORTE_EXTRUS_O5_DEPTH, mode=Mode.SUBTRACT)


solid = part.part
